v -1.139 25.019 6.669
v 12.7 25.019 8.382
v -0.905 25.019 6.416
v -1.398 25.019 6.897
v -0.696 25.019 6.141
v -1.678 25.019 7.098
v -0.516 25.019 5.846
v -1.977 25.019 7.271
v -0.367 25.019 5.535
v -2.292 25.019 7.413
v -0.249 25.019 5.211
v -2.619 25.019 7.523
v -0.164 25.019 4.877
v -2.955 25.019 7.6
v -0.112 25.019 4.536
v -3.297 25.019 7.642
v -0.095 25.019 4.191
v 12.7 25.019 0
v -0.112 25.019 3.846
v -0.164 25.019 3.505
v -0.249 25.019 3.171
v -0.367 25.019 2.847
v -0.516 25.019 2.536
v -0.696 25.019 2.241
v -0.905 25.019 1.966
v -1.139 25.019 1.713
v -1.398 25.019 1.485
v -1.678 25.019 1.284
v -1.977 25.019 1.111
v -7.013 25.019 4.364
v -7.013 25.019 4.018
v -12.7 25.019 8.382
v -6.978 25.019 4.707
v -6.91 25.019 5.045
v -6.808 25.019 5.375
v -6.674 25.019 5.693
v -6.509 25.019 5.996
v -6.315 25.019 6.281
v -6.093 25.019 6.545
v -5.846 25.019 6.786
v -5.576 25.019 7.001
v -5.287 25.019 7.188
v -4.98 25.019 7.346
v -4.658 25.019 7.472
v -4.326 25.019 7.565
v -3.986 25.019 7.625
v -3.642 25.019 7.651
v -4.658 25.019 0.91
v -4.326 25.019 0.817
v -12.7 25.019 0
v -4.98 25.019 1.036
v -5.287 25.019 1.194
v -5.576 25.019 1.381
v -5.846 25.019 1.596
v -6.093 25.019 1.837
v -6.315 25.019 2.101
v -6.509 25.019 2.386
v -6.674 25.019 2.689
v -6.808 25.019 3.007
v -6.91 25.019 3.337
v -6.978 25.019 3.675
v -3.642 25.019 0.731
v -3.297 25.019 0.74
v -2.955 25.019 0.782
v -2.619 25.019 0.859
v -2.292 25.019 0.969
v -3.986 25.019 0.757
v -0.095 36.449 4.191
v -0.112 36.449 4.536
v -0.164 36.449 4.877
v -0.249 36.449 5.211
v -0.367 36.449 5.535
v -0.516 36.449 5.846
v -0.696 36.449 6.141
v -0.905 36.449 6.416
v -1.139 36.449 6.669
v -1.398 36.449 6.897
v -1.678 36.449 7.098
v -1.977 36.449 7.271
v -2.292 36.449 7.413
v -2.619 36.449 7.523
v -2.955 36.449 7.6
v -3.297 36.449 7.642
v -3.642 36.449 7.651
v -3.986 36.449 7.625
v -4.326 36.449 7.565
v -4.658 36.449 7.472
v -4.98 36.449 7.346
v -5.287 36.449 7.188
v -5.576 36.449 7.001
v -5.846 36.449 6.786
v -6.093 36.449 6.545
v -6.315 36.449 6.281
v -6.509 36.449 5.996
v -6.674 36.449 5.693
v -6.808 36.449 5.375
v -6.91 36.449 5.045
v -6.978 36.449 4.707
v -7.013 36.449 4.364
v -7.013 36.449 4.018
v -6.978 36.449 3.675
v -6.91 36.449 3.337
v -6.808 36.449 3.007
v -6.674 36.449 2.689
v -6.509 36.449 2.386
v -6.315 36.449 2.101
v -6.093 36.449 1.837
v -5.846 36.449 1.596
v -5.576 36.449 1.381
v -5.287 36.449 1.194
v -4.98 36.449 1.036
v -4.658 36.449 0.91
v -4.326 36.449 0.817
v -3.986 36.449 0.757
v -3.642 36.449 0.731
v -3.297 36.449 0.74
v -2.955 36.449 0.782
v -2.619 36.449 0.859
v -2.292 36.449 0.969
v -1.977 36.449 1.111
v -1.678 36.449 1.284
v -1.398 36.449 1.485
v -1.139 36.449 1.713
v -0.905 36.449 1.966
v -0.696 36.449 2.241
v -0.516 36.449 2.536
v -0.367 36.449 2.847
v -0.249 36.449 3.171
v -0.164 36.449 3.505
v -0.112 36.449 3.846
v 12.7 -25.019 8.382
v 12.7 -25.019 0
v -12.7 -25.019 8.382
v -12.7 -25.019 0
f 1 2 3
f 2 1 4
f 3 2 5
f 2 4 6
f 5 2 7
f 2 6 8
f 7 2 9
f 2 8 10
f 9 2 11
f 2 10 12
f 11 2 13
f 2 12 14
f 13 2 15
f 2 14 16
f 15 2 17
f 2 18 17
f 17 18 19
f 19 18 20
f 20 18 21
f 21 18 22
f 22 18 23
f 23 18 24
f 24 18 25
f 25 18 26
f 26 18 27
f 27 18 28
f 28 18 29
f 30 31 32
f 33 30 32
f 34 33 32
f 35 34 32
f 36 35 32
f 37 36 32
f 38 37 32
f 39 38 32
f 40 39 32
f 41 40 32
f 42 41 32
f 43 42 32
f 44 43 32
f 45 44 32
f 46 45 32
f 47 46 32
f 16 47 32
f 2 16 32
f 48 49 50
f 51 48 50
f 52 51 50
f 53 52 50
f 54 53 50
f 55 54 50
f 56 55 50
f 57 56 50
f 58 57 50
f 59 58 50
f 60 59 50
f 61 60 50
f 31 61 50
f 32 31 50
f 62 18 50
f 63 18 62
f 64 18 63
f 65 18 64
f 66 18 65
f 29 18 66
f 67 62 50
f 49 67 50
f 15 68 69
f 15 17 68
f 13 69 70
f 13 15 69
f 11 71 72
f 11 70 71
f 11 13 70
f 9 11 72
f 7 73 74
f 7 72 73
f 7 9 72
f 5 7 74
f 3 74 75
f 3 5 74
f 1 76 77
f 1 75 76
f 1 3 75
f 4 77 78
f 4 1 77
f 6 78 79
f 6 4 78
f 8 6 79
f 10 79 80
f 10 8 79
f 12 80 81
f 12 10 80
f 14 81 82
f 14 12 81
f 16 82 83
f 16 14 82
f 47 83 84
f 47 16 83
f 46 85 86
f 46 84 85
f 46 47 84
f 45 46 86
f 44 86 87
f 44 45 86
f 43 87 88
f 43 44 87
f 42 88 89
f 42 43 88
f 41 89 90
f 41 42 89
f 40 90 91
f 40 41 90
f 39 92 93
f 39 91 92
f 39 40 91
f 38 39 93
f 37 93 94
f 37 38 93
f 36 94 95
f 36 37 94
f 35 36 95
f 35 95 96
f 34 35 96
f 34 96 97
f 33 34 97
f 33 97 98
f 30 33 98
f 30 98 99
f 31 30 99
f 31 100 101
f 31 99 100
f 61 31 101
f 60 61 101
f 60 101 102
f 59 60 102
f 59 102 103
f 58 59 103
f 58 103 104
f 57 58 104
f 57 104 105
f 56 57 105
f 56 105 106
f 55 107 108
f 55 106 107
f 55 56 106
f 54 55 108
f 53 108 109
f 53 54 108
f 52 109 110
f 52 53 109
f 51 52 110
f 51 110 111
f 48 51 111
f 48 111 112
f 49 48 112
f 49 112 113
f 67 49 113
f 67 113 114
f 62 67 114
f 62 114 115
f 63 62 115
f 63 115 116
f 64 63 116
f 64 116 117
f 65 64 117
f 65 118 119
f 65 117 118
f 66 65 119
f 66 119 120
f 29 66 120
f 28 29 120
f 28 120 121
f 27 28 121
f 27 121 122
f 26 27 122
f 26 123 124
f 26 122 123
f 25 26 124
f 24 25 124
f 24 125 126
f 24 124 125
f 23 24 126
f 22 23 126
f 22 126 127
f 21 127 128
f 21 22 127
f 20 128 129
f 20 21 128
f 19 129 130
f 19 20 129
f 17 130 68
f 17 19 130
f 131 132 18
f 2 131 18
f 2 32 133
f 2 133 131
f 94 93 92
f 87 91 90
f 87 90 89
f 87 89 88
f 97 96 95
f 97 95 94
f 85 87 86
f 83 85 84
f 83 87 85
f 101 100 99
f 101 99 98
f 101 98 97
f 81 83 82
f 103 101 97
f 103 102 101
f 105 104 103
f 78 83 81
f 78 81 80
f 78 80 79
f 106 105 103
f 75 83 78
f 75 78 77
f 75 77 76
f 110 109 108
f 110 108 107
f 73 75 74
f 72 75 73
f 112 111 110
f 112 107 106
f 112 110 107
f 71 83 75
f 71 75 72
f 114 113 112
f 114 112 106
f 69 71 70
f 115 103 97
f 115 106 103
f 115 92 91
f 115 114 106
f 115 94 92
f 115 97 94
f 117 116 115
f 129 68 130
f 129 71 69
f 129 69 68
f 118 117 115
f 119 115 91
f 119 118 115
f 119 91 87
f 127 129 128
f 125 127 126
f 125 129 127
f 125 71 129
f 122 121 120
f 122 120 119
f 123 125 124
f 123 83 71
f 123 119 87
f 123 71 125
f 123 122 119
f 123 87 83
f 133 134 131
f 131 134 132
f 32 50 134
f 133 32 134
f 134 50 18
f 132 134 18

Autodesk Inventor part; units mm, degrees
ref_plane "YZ Plane" through (0, 0, 0) normal (1, 0, 0) x (0, 1, 0)
ref_plane "XZ Plane" through (0, 0, 0) normal (0, 1, 0) x (-1, 0, 0)
ref_plane "XY Plane" through (0, 0, 0) normal (0, 0, 1) x (1, 0, 0)
sketch "Sketch1" plane through (0, 0, 0) normal (0, 0, 1) x (1, 0, 0)
  line L0 (12.7, 25.019) -> (-12.7, 25.019)
  line L1 (-12.7, 25.019) -> (-12.7, -25.019)
  line L2 (-12.7, -25.019) -> (12.7, -25.019)
  line L3 (12.7, -25.019) -> (12.7, 25.019)
  point P0 (0, 0)
  point P1 (-12.7, 0)
  point P2 (0, 25.019)
  dimension "d0" = 25.4
  dimension "d1" = 50.038
extrude "Extrusion1" add sketch "Sketch1" along normal blind 8.382
sketch "Sketch2" plane through (-12.7, 25.019, 0) normal (0, 1, 0) x (1, 0, 0)
  line L0 (0, 0) -> (0, -8.382) projected
  circle A0 centre (9.144, -4.191) radius 3.4611
  point P0 (12.7, 0)
  dimension "d4" = 9.144
extrude "Extrusion2" add sketch "Sketch2" along normal blind 11.43
properties part number "Video Tx"
